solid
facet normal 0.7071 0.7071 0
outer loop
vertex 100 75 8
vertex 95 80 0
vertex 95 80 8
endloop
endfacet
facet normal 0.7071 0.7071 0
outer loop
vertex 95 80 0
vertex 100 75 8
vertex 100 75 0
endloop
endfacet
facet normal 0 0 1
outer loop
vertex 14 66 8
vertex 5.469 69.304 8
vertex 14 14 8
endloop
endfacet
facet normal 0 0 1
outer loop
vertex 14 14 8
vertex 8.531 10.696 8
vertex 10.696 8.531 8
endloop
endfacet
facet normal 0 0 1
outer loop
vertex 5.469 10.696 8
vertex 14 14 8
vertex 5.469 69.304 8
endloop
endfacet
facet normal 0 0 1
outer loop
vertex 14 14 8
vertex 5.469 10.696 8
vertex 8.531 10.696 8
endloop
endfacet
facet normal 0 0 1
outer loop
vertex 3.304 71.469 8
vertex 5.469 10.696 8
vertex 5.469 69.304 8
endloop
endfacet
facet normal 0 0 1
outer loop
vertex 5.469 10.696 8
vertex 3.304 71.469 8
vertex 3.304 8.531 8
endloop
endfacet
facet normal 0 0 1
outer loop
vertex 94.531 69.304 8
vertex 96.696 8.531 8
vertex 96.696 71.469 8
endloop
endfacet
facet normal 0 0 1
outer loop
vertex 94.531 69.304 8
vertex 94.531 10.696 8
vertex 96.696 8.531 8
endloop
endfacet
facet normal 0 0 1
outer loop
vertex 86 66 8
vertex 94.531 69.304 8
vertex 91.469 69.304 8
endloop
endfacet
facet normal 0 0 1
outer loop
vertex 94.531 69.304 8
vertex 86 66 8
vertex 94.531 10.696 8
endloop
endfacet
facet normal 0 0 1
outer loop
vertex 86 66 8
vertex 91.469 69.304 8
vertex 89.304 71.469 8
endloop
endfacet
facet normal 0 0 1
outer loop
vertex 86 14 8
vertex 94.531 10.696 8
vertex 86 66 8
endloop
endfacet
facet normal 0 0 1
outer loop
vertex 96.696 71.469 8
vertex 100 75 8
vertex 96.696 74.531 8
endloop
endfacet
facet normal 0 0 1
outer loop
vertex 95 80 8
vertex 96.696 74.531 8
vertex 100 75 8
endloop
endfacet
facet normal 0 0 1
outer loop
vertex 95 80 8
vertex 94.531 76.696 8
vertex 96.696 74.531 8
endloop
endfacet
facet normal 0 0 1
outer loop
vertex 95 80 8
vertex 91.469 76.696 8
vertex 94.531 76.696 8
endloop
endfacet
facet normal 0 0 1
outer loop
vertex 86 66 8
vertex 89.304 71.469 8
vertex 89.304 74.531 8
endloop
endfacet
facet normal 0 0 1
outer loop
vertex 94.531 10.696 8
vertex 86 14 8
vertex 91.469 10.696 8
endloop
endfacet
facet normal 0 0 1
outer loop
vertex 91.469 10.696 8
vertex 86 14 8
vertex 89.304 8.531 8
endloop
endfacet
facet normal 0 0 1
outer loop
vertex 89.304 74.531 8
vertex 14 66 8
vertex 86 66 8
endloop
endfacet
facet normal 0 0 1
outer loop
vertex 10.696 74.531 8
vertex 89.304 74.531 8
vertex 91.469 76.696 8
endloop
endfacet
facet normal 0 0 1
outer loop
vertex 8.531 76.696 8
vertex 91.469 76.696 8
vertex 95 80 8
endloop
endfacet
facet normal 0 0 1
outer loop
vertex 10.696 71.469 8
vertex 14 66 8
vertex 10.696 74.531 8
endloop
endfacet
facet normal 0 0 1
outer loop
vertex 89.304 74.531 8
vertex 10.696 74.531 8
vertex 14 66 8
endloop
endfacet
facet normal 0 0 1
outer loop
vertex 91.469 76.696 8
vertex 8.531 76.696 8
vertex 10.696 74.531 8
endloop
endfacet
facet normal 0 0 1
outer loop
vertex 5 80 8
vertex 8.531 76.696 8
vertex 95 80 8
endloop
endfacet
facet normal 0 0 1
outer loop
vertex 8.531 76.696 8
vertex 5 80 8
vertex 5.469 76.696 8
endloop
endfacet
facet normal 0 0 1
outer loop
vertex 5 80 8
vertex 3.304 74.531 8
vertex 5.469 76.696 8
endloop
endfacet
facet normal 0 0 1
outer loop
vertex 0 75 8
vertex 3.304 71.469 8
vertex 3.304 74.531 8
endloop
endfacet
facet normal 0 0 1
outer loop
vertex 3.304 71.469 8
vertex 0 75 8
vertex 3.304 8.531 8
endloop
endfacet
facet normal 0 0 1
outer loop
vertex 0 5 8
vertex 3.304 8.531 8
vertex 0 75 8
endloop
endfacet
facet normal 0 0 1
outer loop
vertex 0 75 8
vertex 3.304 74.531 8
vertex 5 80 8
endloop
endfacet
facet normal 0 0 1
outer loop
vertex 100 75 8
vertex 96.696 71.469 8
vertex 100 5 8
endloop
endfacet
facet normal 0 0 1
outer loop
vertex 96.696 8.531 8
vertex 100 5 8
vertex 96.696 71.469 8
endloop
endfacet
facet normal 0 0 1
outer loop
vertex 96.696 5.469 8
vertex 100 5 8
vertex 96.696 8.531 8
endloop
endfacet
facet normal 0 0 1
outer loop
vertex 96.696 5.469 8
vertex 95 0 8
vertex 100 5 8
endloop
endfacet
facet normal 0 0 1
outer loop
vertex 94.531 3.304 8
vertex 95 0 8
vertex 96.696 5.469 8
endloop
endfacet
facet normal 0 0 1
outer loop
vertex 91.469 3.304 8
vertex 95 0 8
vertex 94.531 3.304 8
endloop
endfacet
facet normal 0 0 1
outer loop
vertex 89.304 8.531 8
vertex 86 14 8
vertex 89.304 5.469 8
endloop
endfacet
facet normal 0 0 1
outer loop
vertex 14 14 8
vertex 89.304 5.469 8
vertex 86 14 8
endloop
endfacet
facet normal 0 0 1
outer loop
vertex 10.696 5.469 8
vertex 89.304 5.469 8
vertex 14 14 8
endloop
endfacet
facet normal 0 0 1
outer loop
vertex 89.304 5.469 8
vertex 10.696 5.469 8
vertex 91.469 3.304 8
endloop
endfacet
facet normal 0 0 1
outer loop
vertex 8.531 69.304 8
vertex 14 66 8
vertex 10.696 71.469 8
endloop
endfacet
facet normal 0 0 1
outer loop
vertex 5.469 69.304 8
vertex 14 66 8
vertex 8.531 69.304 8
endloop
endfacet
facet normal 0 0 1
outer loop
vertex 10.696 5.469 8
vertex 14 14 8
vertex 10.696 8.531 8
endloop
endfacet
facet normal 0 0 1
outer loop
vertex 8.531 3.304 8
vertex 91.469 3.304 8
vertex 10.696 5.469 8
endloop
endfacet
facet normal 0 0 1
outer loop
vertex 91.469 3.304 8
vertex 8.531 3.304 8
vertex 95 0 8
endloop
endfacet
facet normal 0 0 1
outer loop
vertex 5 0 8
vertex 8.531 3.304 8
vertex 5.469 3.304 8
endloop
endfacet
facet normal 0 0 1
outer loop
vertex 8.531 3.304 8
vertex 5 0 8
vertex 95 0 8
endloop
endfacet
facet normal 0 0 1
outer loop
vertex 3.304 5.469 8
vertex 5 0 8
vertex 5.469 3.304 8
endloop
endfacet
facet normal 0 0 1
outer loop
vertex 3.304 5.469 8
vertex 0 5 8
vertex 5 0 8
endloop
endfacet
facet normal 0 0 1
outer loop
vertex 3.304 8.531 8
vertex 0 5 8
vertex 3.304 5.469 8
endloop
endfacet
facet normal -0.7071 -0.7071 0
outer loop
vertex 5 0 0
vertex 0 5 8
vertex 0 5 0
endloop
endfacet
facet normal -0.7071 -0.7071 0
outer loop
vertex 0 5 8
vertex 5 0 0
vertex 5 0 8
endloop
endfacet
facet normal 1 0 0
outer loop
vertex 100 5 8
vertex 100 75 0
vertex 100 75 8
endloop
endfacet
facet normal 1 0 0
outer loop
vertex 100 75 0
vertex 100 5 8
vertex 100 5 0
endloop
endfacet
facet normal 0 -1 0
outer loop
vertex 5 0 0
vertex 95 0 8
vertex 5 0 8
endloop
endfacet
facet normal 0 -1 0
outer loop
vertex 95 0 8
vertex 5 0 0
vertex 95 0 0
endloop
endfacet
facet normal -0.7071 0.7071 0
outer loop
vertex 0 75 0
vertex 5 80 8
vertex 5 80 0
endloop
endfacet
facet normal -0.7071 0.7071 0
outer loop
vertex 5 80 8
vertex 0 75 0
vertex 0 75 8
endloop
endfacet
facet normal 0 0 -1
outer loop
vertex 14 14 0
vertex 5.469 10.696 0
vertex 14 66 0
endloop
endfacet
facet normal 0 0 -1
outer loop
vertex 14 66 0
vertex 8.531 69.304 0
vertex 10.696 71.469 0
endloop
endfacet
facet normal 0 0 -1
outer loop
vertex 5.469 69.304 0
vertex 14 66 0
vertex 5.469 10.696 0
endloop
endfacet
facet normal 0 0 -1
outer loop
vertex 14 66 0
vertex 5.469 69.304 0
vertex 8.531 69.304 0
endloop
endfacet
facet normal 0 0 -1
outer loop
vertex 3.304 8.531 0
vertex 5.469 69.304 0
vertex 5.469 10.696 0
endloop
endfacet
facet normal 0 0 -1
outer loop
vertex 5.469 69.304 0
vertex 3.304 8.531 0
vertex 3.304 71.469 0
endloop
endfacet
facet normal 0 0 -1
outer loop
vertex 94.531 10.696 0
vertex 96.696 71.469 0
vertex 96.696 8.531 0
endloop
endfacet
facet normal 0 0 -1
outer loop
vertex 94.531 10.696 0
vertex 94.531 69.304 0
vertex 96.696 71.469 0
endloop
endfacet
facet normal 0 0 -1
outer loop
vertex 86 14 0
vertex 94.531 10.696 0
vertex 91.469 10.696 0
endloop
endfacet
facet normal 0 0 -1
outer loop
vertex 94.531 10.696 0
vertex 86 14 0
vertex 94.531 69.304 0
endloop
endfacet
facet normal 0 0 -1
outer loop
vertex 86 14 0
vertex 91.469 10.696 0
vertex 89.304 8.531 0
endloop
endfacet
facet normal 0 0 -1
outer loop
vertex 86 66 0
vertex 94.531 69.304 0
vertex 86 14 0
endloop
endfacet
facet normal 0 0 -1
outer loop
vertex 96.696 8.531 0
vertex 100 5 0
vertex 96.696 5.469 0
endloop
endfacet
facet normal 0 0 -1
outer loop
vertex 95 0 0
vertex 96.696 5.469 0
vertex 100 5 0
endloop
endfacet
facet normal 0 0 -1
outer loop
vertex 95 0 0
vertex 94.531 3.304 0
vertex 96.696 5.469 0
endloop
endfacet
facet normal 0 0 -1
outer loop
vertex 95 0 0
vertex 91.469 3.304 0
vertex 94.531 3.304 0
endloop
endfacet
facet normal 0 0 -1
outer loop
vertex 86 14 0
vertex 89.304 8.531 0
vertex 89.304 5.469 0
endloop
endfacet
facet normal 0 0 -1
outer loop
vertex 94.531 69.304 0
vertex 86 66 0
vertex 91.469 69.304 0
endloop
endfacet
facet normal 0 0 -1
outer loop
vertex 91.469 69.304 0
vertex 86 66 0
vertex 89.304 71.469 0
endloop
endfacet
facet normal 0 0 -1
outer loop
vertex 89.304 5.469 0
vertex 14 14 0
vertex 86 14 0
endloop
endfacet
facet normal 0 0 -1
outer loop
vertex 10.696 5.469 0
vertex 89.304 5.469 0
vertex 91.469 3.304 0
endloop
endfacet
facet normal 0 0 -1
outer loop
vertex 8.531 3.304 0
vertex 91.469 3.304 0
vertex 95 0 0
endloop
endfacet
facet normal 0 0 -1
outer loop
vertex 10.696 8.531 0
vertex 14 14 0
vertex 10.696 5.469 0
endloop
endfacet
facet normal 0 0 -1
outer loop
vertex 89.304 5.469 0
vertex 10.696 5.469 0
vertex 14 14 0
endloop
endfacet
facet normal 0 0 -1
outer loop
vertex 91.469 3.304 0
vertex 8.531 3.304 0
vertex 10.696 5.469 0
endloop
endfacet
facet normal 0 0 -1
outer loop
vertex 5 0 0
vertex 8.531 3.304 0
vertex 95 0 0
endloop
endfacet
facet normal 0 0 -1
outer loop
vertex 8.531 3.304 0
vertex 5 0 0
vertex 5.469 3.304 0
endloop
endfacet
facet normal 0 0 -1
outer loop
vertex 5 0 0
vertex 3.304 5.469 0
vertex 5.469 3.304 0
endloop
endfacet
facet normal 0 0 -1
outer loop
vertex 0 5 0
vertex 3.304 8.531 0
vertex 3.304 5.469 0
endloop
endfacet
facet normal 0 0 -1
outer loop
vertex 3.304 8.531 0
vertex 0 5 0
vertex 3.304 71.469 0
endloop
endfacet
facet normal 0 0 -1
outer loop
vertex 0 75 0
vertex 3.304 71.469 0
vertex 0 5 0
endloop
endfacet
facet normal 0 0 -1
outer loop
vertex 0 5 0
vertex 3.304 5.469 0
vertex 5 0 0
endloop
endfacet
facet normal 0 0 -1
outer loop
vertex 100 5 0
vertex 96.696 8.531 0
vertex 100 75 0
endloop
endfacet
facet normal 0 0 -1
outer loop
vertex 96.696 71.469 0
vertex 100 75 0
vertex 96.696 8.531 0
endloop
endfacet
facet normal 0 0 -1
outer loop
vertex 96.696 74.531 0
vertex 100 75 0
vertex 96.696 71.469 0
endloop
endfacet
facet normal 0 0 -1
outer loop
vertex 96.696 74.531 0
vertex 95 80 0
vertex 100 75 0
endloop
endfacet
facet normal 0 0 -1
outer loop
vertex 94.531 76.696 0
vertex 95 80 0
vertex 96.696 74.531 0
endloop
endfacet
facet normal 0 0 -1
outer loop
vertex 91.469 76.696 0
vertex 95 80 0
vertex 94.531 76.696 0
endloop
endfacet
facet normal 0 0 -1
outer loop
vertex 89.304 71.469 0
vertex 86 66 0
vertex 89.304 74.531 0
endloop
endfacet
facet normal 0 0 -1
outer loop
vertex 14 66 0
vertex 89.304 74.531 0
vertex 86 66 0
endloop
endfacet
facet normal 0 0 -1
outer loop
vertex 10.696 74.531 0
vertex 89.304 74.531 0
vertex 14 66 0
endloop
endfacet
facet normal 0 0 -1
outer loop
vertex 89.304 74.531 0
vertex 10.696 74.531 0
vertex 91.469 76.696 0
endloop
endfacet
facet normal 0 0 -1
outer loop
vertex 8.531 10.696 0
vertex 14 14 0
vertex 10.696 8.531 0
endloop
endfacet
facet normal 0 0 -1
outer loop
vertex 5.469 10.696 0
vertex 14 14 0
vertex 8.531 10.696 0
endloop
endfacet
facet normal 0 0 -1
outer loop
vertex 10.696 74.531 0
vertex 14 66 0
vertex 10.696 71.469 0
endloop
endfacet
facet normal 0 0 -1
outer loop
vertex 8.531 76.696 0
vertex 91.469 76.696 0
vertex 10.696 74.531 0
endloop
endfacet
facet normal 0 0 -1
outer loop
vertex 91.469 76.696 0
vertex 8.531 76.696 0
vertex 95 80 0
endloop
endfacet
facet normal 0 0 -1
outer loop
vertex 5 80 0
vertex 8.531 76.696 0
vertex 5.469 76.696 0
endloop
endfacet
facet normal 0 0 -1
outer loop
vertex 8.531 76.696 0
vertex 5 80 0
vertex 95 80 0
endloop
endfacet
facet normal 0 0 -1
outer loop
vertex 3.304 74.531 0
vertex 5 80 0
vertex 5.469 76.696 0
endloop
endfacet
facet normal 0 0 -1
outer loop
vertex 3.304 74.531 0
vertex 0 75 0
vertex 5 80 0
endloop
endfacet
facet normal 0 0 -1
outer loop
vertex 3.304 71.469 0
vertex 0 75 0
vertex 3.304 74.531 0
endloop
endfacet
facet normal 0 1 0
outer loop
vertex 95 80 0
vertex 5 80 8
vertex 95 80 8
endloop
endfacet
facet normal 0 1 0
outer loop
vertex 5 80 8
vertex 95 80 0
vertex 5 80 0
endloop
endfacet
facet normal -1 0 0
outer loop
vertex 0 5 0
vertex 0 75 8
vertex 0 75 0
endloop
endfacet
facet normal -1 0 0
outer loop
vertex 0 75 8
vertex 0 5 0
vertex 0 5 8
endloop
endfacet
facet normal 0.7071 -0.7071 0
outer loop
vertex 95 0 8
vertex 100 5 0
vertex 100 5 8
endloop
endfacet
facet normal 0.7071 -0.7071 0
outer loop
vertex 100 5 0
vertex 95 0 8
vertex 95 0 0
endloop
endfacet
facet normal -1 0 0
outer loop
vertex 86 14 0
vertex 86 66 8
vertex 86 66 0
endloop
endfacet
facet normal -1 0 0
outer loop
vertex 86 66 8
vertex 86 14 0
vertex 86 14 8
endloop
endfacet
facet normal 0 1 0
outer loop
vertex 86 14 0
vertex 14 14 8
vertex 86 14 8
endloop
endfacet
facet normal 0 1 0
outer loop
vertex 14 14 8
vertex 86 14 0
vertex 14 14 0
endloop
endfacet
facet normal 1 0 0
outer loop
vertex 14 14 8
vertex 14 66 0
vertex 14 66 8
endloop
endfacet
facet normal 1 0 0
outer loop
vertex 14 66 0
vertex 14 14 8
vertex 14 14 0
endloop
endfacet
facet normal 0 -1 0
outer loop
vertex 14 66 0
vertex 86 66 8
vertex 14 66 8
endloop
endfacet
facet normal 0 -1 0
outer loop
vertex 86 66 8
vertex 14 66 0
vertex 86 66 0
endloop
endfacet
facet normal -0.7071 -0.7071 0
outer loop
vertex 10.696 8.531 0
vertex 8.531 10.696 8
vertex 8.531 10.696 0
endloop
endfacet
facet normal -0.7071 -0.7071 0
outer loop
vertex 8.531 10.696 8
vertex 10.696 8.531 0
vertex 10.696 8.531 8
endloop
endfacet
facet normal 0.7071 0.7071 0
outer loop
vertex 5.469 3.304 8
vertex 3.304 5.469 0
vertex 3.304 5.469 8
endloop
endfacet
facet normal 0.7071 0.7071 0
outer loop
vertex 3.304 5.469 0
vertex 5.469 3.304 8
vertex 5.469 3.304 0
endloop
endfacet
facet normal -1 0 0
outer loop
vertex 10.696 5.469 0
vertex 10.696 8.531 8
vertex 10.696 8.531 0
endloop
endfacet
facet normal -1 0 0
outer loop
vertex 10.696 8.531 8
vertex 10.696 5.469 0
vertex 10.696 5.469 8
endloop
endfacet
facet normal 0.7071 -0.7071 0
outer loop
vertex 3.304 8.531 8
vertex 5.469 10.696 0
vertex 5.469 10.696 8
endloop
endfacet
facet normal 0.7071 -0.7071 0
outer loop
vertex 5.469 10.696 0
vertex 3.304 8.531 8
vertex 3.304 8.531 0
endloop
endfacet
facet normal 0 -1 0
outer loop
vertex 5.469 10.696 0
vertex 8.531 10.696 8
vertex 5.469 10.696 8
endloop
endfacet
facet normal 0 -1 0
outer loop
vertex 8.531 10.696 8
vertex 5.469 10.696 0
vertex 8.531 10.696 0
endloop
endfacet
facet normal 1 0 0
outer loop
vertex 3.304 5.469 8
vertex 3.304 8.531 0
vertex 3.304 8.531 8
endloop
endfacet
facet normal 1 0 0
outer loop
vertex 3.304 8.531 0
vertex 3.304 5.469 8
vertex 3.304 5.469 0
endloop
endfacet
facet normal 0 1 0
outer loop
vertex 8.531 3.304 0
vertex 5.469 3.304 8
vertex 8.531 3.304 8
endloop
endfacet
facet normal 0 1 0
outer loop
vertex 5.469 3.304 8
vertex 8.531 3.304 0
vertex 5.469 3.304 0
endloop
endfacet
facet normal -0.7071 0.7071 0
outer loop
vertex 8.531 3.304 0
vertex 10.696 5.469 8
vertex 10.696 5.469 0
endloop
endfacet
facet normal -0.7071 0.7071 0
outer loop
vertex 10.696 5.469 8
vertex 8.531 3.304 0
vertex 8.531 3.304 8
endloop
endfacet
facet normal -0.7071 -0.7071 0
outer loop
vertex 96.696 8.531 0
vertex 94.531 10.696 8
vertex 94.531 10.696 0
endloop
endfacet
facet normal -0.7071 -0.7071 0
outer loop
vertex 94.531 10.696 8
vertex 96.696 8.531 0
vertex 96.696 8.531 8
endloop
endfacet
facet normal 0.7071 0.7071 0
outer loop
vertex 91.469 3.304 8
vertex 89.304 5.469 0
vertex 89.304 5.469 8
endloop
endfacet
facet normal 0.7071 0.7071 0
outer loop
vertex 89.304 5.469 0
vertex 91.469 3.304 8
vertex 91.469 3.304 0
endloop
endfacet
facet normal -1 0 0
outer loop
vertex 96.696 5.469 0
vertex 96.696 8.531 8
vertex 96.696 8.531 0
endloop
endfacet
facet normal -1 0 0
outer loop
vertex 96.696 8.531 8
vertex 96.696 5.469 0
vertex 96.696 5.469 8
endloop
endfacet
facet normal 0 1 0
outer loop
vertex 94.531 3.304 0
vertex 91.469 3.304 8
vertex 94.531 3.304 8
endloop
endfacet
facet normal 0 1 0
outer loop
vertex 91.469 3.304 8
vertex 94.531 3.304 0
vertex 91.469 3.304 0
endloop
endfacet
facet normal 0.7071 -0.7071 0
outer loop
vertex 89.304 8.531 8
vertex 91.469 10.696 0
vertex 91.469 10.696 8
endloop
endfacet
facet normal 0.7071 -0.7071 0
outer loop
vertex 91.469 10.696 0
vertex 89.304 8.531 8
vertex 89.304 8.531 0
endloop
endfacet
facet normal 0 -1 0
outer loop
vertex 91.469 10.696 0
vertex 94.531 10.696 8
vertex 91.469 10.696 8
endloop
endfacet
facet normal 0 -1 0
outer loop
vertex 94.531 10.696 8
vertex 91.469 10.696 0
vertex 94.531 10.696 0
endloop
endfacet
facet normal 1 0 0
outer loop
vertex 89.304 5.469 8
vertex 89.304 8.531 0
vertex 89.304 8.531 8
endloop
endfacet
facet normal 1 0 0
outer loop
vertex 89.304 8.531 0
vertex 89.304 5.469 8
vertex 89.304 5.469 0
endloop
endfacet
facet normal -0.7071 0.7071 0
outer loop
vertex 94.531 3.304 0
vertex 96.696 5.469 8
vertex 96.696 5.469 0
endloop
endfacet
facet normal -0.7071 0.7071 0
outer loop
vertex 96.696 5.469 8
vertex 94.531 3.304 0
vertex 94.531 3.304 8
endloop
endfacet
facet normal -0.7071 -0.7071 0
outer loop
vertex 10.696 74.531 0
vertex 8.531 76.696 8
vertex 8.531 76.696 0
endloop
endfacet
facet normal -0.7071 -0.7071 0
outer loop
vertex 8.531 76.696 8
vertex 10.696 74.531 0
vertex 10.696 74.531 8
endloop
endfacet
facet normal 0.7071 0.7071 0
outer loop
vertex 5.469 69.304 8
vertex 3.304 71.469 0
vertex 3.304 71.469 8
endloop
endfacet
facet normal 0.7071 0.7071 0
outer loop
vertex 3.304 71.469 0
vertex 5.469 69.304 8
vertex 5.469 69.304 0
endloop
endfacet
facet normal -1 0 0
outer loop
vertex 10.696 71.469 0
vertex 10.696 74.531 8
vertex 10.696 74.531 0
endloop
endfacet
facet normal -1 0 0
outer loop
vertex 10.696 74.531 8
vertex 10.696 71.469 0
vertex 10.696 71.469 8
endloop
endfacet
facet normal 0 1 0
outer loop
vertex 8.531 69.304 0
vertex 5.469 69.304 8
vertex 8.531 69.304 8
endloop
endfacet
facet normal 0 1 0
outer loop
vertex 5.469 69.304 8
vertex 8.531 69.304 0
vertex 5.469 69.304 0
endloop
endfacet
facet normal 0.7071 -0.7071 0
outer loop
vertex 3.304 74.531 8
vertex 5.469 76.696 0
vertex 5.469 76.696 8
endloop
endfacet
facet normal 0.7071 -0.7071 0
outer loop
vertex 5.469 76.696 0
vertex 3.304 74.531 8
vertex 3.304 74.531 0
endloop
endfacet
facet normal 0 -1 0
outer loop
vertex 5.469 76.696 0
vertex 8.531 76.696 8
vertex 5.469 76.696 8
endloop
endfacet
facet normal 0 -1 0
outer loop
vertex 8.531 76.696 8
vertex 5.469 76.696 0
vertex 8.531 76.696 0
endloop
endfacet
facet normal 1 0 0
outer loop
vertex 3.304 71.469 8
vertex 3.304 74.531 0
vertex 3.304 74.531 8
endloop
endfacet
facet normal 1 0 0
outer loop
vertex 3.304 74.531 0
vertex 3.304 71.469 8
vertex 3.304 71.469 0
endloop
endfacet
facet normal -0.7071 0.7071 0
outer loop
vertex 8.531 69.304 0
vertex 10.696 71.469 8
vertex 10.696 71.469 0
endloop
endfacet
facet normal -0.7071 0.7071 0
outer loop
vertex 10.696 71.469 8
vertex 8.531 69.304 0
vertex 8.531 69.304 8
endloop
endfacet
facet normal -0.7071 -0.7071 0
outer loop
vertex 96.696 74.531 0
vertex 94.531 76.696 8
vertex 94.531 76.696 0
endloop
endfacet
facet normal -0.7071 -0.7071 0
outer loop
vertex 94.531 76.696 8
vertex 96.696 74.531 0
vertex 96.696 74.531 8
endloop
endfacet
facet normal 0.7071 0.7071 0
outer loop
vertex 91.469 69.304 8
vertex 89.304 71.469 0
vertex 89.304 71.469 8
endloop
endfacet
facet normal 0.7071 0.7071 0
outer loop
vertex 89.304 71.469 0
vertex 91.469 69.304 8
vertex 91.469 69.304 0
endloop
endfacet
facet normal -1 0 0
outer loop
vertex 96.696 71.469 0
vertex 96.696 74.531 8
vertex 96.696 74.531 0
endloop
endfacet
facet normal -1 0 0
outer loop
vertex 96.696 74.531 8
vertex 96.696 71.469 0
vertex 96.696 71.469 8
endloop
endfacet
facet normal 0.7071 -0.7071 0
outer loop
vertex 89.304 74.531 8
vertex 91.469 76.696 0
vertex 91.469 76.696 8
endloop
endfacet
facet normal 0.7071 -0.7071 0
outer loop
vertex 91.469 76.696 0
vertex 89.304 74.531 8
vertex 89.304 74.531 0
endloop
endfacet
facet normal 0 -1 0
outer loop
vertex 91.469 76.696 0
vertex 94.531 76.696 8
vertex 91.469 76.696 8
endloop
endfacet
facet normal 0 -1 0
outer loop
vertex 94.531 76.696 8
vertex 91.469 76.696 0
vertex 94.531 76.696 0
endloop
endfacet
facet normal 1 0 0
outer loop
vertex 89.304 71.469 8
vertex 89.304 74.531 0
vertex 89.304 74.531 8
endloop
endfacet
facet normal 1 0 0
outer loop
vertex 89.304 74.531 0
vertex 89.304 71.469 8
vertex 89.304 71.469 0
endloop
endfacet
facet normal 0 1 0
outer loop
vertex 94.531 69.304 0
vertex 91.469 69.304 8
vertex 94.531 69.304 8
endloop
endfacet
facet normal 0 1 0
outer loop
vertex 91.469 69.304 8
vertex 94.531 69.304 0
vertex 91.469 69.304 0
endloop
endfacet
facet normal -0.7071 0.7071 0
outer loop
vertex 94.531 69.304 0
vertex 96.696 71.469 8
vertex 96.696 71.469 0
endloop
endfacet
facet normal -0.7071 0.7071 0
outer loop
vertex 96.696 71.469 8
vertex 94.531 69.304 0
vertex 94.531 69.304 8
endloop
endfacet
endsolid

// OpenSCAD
$fn = 32;

// ----------------------------------------------------------------------
// Frame plate: 100 x 80 frame, 14 mm rails
// ----------------------------------------------------------------------

// --- parameters (mm) ---
plate_l = 100;            // plate length, X
plate_w = 80;             // plate width, Y
plate_t = 8;              // plate thickness, Z (extrusion height)
corner_c = 5;             // corner chamfer
frame_bar = 14;           // frame rail width
bolt_r = 4;               // corner bolt window radius
bolt_inset = 7;           // bolt centre inset from the edges
fit_tol = 0.05;           // declared fit tolerance (prompt contract)
free_tol = 0.3;           // declared free tolerance (prompt contract)

win_l = plate_l - 2 * frame_bar;  // window length
win_w = plate_w - 2 * frame_bar;  // window width
bolt_d = 2 * bolt_r;  // corner hole diameter

profile = [[5, 0], [95, 0], [100, 5], [100, 75], [95, 80], [5, 80], [0, 75], [0, 5]];  // primary outline, 8 points, counter clockwise
void_1 = [[14, 14], [86, 14], [86, 66], [14, 66]];  // the window, 4 points
void_2 = [[10.696, 8.531], [8.531, 10.696], [5.469, 10.696], [3.304, 8.531], [3.304, 5.469], [5.469, 3.304], [8.531, 3.304], [10.696, 5.469]];  // corner bolt window, 8 points
void_3 = [[96.696, 8.531], [94.531, 10.696], [91.469, 10.696], [89.304, 8.531], [89.304, 5.469], [91.469, 3.304], [94.531, 3.304], [96.696, 5.469]];  // corner bolt window, 8 points
void_4 = [[10.696, 74.531], [8.531, 76.696], [5.469, 76.696], [3.304, 74.531], [3.304, 71.469], [5.469, 69.304], [8.531, 69.304], [10.696, 71.469]];  // corner bolt window, 8 points
void_5 = [[96.696, 74.531], [94.531, 76.696], [91.469, 76.696], [89.304, 74.531], [89.304, 71.469], [91.469, 69.304], [94.531, 69.304], [96.696, 71.469]];  // corner bolt window, 8 points

// --- the one profile operation ---
difference() {
  linear_extrude(height = plate_t) polygon(points = profile);
  translate([0, 0, -1])
    linear_extrude(height = plate_t + 2) polygon(points = void_1);
  translate([0, 0, -1])
    linear_extrude(height = plate_t + 2) polygon(points = void_2);
  translate([0, 0, -1])
    linear_extrude(height = plate_t + 2) polygon(points = void_3);
  translate([0, 0, -1])
    linear_extrude(height = plate_t + 2) polygon(points = void_4);
  translate([0, 0, -1])
    linear_extrude(height = plate_t + 2) polygon(points = void_5);
}
